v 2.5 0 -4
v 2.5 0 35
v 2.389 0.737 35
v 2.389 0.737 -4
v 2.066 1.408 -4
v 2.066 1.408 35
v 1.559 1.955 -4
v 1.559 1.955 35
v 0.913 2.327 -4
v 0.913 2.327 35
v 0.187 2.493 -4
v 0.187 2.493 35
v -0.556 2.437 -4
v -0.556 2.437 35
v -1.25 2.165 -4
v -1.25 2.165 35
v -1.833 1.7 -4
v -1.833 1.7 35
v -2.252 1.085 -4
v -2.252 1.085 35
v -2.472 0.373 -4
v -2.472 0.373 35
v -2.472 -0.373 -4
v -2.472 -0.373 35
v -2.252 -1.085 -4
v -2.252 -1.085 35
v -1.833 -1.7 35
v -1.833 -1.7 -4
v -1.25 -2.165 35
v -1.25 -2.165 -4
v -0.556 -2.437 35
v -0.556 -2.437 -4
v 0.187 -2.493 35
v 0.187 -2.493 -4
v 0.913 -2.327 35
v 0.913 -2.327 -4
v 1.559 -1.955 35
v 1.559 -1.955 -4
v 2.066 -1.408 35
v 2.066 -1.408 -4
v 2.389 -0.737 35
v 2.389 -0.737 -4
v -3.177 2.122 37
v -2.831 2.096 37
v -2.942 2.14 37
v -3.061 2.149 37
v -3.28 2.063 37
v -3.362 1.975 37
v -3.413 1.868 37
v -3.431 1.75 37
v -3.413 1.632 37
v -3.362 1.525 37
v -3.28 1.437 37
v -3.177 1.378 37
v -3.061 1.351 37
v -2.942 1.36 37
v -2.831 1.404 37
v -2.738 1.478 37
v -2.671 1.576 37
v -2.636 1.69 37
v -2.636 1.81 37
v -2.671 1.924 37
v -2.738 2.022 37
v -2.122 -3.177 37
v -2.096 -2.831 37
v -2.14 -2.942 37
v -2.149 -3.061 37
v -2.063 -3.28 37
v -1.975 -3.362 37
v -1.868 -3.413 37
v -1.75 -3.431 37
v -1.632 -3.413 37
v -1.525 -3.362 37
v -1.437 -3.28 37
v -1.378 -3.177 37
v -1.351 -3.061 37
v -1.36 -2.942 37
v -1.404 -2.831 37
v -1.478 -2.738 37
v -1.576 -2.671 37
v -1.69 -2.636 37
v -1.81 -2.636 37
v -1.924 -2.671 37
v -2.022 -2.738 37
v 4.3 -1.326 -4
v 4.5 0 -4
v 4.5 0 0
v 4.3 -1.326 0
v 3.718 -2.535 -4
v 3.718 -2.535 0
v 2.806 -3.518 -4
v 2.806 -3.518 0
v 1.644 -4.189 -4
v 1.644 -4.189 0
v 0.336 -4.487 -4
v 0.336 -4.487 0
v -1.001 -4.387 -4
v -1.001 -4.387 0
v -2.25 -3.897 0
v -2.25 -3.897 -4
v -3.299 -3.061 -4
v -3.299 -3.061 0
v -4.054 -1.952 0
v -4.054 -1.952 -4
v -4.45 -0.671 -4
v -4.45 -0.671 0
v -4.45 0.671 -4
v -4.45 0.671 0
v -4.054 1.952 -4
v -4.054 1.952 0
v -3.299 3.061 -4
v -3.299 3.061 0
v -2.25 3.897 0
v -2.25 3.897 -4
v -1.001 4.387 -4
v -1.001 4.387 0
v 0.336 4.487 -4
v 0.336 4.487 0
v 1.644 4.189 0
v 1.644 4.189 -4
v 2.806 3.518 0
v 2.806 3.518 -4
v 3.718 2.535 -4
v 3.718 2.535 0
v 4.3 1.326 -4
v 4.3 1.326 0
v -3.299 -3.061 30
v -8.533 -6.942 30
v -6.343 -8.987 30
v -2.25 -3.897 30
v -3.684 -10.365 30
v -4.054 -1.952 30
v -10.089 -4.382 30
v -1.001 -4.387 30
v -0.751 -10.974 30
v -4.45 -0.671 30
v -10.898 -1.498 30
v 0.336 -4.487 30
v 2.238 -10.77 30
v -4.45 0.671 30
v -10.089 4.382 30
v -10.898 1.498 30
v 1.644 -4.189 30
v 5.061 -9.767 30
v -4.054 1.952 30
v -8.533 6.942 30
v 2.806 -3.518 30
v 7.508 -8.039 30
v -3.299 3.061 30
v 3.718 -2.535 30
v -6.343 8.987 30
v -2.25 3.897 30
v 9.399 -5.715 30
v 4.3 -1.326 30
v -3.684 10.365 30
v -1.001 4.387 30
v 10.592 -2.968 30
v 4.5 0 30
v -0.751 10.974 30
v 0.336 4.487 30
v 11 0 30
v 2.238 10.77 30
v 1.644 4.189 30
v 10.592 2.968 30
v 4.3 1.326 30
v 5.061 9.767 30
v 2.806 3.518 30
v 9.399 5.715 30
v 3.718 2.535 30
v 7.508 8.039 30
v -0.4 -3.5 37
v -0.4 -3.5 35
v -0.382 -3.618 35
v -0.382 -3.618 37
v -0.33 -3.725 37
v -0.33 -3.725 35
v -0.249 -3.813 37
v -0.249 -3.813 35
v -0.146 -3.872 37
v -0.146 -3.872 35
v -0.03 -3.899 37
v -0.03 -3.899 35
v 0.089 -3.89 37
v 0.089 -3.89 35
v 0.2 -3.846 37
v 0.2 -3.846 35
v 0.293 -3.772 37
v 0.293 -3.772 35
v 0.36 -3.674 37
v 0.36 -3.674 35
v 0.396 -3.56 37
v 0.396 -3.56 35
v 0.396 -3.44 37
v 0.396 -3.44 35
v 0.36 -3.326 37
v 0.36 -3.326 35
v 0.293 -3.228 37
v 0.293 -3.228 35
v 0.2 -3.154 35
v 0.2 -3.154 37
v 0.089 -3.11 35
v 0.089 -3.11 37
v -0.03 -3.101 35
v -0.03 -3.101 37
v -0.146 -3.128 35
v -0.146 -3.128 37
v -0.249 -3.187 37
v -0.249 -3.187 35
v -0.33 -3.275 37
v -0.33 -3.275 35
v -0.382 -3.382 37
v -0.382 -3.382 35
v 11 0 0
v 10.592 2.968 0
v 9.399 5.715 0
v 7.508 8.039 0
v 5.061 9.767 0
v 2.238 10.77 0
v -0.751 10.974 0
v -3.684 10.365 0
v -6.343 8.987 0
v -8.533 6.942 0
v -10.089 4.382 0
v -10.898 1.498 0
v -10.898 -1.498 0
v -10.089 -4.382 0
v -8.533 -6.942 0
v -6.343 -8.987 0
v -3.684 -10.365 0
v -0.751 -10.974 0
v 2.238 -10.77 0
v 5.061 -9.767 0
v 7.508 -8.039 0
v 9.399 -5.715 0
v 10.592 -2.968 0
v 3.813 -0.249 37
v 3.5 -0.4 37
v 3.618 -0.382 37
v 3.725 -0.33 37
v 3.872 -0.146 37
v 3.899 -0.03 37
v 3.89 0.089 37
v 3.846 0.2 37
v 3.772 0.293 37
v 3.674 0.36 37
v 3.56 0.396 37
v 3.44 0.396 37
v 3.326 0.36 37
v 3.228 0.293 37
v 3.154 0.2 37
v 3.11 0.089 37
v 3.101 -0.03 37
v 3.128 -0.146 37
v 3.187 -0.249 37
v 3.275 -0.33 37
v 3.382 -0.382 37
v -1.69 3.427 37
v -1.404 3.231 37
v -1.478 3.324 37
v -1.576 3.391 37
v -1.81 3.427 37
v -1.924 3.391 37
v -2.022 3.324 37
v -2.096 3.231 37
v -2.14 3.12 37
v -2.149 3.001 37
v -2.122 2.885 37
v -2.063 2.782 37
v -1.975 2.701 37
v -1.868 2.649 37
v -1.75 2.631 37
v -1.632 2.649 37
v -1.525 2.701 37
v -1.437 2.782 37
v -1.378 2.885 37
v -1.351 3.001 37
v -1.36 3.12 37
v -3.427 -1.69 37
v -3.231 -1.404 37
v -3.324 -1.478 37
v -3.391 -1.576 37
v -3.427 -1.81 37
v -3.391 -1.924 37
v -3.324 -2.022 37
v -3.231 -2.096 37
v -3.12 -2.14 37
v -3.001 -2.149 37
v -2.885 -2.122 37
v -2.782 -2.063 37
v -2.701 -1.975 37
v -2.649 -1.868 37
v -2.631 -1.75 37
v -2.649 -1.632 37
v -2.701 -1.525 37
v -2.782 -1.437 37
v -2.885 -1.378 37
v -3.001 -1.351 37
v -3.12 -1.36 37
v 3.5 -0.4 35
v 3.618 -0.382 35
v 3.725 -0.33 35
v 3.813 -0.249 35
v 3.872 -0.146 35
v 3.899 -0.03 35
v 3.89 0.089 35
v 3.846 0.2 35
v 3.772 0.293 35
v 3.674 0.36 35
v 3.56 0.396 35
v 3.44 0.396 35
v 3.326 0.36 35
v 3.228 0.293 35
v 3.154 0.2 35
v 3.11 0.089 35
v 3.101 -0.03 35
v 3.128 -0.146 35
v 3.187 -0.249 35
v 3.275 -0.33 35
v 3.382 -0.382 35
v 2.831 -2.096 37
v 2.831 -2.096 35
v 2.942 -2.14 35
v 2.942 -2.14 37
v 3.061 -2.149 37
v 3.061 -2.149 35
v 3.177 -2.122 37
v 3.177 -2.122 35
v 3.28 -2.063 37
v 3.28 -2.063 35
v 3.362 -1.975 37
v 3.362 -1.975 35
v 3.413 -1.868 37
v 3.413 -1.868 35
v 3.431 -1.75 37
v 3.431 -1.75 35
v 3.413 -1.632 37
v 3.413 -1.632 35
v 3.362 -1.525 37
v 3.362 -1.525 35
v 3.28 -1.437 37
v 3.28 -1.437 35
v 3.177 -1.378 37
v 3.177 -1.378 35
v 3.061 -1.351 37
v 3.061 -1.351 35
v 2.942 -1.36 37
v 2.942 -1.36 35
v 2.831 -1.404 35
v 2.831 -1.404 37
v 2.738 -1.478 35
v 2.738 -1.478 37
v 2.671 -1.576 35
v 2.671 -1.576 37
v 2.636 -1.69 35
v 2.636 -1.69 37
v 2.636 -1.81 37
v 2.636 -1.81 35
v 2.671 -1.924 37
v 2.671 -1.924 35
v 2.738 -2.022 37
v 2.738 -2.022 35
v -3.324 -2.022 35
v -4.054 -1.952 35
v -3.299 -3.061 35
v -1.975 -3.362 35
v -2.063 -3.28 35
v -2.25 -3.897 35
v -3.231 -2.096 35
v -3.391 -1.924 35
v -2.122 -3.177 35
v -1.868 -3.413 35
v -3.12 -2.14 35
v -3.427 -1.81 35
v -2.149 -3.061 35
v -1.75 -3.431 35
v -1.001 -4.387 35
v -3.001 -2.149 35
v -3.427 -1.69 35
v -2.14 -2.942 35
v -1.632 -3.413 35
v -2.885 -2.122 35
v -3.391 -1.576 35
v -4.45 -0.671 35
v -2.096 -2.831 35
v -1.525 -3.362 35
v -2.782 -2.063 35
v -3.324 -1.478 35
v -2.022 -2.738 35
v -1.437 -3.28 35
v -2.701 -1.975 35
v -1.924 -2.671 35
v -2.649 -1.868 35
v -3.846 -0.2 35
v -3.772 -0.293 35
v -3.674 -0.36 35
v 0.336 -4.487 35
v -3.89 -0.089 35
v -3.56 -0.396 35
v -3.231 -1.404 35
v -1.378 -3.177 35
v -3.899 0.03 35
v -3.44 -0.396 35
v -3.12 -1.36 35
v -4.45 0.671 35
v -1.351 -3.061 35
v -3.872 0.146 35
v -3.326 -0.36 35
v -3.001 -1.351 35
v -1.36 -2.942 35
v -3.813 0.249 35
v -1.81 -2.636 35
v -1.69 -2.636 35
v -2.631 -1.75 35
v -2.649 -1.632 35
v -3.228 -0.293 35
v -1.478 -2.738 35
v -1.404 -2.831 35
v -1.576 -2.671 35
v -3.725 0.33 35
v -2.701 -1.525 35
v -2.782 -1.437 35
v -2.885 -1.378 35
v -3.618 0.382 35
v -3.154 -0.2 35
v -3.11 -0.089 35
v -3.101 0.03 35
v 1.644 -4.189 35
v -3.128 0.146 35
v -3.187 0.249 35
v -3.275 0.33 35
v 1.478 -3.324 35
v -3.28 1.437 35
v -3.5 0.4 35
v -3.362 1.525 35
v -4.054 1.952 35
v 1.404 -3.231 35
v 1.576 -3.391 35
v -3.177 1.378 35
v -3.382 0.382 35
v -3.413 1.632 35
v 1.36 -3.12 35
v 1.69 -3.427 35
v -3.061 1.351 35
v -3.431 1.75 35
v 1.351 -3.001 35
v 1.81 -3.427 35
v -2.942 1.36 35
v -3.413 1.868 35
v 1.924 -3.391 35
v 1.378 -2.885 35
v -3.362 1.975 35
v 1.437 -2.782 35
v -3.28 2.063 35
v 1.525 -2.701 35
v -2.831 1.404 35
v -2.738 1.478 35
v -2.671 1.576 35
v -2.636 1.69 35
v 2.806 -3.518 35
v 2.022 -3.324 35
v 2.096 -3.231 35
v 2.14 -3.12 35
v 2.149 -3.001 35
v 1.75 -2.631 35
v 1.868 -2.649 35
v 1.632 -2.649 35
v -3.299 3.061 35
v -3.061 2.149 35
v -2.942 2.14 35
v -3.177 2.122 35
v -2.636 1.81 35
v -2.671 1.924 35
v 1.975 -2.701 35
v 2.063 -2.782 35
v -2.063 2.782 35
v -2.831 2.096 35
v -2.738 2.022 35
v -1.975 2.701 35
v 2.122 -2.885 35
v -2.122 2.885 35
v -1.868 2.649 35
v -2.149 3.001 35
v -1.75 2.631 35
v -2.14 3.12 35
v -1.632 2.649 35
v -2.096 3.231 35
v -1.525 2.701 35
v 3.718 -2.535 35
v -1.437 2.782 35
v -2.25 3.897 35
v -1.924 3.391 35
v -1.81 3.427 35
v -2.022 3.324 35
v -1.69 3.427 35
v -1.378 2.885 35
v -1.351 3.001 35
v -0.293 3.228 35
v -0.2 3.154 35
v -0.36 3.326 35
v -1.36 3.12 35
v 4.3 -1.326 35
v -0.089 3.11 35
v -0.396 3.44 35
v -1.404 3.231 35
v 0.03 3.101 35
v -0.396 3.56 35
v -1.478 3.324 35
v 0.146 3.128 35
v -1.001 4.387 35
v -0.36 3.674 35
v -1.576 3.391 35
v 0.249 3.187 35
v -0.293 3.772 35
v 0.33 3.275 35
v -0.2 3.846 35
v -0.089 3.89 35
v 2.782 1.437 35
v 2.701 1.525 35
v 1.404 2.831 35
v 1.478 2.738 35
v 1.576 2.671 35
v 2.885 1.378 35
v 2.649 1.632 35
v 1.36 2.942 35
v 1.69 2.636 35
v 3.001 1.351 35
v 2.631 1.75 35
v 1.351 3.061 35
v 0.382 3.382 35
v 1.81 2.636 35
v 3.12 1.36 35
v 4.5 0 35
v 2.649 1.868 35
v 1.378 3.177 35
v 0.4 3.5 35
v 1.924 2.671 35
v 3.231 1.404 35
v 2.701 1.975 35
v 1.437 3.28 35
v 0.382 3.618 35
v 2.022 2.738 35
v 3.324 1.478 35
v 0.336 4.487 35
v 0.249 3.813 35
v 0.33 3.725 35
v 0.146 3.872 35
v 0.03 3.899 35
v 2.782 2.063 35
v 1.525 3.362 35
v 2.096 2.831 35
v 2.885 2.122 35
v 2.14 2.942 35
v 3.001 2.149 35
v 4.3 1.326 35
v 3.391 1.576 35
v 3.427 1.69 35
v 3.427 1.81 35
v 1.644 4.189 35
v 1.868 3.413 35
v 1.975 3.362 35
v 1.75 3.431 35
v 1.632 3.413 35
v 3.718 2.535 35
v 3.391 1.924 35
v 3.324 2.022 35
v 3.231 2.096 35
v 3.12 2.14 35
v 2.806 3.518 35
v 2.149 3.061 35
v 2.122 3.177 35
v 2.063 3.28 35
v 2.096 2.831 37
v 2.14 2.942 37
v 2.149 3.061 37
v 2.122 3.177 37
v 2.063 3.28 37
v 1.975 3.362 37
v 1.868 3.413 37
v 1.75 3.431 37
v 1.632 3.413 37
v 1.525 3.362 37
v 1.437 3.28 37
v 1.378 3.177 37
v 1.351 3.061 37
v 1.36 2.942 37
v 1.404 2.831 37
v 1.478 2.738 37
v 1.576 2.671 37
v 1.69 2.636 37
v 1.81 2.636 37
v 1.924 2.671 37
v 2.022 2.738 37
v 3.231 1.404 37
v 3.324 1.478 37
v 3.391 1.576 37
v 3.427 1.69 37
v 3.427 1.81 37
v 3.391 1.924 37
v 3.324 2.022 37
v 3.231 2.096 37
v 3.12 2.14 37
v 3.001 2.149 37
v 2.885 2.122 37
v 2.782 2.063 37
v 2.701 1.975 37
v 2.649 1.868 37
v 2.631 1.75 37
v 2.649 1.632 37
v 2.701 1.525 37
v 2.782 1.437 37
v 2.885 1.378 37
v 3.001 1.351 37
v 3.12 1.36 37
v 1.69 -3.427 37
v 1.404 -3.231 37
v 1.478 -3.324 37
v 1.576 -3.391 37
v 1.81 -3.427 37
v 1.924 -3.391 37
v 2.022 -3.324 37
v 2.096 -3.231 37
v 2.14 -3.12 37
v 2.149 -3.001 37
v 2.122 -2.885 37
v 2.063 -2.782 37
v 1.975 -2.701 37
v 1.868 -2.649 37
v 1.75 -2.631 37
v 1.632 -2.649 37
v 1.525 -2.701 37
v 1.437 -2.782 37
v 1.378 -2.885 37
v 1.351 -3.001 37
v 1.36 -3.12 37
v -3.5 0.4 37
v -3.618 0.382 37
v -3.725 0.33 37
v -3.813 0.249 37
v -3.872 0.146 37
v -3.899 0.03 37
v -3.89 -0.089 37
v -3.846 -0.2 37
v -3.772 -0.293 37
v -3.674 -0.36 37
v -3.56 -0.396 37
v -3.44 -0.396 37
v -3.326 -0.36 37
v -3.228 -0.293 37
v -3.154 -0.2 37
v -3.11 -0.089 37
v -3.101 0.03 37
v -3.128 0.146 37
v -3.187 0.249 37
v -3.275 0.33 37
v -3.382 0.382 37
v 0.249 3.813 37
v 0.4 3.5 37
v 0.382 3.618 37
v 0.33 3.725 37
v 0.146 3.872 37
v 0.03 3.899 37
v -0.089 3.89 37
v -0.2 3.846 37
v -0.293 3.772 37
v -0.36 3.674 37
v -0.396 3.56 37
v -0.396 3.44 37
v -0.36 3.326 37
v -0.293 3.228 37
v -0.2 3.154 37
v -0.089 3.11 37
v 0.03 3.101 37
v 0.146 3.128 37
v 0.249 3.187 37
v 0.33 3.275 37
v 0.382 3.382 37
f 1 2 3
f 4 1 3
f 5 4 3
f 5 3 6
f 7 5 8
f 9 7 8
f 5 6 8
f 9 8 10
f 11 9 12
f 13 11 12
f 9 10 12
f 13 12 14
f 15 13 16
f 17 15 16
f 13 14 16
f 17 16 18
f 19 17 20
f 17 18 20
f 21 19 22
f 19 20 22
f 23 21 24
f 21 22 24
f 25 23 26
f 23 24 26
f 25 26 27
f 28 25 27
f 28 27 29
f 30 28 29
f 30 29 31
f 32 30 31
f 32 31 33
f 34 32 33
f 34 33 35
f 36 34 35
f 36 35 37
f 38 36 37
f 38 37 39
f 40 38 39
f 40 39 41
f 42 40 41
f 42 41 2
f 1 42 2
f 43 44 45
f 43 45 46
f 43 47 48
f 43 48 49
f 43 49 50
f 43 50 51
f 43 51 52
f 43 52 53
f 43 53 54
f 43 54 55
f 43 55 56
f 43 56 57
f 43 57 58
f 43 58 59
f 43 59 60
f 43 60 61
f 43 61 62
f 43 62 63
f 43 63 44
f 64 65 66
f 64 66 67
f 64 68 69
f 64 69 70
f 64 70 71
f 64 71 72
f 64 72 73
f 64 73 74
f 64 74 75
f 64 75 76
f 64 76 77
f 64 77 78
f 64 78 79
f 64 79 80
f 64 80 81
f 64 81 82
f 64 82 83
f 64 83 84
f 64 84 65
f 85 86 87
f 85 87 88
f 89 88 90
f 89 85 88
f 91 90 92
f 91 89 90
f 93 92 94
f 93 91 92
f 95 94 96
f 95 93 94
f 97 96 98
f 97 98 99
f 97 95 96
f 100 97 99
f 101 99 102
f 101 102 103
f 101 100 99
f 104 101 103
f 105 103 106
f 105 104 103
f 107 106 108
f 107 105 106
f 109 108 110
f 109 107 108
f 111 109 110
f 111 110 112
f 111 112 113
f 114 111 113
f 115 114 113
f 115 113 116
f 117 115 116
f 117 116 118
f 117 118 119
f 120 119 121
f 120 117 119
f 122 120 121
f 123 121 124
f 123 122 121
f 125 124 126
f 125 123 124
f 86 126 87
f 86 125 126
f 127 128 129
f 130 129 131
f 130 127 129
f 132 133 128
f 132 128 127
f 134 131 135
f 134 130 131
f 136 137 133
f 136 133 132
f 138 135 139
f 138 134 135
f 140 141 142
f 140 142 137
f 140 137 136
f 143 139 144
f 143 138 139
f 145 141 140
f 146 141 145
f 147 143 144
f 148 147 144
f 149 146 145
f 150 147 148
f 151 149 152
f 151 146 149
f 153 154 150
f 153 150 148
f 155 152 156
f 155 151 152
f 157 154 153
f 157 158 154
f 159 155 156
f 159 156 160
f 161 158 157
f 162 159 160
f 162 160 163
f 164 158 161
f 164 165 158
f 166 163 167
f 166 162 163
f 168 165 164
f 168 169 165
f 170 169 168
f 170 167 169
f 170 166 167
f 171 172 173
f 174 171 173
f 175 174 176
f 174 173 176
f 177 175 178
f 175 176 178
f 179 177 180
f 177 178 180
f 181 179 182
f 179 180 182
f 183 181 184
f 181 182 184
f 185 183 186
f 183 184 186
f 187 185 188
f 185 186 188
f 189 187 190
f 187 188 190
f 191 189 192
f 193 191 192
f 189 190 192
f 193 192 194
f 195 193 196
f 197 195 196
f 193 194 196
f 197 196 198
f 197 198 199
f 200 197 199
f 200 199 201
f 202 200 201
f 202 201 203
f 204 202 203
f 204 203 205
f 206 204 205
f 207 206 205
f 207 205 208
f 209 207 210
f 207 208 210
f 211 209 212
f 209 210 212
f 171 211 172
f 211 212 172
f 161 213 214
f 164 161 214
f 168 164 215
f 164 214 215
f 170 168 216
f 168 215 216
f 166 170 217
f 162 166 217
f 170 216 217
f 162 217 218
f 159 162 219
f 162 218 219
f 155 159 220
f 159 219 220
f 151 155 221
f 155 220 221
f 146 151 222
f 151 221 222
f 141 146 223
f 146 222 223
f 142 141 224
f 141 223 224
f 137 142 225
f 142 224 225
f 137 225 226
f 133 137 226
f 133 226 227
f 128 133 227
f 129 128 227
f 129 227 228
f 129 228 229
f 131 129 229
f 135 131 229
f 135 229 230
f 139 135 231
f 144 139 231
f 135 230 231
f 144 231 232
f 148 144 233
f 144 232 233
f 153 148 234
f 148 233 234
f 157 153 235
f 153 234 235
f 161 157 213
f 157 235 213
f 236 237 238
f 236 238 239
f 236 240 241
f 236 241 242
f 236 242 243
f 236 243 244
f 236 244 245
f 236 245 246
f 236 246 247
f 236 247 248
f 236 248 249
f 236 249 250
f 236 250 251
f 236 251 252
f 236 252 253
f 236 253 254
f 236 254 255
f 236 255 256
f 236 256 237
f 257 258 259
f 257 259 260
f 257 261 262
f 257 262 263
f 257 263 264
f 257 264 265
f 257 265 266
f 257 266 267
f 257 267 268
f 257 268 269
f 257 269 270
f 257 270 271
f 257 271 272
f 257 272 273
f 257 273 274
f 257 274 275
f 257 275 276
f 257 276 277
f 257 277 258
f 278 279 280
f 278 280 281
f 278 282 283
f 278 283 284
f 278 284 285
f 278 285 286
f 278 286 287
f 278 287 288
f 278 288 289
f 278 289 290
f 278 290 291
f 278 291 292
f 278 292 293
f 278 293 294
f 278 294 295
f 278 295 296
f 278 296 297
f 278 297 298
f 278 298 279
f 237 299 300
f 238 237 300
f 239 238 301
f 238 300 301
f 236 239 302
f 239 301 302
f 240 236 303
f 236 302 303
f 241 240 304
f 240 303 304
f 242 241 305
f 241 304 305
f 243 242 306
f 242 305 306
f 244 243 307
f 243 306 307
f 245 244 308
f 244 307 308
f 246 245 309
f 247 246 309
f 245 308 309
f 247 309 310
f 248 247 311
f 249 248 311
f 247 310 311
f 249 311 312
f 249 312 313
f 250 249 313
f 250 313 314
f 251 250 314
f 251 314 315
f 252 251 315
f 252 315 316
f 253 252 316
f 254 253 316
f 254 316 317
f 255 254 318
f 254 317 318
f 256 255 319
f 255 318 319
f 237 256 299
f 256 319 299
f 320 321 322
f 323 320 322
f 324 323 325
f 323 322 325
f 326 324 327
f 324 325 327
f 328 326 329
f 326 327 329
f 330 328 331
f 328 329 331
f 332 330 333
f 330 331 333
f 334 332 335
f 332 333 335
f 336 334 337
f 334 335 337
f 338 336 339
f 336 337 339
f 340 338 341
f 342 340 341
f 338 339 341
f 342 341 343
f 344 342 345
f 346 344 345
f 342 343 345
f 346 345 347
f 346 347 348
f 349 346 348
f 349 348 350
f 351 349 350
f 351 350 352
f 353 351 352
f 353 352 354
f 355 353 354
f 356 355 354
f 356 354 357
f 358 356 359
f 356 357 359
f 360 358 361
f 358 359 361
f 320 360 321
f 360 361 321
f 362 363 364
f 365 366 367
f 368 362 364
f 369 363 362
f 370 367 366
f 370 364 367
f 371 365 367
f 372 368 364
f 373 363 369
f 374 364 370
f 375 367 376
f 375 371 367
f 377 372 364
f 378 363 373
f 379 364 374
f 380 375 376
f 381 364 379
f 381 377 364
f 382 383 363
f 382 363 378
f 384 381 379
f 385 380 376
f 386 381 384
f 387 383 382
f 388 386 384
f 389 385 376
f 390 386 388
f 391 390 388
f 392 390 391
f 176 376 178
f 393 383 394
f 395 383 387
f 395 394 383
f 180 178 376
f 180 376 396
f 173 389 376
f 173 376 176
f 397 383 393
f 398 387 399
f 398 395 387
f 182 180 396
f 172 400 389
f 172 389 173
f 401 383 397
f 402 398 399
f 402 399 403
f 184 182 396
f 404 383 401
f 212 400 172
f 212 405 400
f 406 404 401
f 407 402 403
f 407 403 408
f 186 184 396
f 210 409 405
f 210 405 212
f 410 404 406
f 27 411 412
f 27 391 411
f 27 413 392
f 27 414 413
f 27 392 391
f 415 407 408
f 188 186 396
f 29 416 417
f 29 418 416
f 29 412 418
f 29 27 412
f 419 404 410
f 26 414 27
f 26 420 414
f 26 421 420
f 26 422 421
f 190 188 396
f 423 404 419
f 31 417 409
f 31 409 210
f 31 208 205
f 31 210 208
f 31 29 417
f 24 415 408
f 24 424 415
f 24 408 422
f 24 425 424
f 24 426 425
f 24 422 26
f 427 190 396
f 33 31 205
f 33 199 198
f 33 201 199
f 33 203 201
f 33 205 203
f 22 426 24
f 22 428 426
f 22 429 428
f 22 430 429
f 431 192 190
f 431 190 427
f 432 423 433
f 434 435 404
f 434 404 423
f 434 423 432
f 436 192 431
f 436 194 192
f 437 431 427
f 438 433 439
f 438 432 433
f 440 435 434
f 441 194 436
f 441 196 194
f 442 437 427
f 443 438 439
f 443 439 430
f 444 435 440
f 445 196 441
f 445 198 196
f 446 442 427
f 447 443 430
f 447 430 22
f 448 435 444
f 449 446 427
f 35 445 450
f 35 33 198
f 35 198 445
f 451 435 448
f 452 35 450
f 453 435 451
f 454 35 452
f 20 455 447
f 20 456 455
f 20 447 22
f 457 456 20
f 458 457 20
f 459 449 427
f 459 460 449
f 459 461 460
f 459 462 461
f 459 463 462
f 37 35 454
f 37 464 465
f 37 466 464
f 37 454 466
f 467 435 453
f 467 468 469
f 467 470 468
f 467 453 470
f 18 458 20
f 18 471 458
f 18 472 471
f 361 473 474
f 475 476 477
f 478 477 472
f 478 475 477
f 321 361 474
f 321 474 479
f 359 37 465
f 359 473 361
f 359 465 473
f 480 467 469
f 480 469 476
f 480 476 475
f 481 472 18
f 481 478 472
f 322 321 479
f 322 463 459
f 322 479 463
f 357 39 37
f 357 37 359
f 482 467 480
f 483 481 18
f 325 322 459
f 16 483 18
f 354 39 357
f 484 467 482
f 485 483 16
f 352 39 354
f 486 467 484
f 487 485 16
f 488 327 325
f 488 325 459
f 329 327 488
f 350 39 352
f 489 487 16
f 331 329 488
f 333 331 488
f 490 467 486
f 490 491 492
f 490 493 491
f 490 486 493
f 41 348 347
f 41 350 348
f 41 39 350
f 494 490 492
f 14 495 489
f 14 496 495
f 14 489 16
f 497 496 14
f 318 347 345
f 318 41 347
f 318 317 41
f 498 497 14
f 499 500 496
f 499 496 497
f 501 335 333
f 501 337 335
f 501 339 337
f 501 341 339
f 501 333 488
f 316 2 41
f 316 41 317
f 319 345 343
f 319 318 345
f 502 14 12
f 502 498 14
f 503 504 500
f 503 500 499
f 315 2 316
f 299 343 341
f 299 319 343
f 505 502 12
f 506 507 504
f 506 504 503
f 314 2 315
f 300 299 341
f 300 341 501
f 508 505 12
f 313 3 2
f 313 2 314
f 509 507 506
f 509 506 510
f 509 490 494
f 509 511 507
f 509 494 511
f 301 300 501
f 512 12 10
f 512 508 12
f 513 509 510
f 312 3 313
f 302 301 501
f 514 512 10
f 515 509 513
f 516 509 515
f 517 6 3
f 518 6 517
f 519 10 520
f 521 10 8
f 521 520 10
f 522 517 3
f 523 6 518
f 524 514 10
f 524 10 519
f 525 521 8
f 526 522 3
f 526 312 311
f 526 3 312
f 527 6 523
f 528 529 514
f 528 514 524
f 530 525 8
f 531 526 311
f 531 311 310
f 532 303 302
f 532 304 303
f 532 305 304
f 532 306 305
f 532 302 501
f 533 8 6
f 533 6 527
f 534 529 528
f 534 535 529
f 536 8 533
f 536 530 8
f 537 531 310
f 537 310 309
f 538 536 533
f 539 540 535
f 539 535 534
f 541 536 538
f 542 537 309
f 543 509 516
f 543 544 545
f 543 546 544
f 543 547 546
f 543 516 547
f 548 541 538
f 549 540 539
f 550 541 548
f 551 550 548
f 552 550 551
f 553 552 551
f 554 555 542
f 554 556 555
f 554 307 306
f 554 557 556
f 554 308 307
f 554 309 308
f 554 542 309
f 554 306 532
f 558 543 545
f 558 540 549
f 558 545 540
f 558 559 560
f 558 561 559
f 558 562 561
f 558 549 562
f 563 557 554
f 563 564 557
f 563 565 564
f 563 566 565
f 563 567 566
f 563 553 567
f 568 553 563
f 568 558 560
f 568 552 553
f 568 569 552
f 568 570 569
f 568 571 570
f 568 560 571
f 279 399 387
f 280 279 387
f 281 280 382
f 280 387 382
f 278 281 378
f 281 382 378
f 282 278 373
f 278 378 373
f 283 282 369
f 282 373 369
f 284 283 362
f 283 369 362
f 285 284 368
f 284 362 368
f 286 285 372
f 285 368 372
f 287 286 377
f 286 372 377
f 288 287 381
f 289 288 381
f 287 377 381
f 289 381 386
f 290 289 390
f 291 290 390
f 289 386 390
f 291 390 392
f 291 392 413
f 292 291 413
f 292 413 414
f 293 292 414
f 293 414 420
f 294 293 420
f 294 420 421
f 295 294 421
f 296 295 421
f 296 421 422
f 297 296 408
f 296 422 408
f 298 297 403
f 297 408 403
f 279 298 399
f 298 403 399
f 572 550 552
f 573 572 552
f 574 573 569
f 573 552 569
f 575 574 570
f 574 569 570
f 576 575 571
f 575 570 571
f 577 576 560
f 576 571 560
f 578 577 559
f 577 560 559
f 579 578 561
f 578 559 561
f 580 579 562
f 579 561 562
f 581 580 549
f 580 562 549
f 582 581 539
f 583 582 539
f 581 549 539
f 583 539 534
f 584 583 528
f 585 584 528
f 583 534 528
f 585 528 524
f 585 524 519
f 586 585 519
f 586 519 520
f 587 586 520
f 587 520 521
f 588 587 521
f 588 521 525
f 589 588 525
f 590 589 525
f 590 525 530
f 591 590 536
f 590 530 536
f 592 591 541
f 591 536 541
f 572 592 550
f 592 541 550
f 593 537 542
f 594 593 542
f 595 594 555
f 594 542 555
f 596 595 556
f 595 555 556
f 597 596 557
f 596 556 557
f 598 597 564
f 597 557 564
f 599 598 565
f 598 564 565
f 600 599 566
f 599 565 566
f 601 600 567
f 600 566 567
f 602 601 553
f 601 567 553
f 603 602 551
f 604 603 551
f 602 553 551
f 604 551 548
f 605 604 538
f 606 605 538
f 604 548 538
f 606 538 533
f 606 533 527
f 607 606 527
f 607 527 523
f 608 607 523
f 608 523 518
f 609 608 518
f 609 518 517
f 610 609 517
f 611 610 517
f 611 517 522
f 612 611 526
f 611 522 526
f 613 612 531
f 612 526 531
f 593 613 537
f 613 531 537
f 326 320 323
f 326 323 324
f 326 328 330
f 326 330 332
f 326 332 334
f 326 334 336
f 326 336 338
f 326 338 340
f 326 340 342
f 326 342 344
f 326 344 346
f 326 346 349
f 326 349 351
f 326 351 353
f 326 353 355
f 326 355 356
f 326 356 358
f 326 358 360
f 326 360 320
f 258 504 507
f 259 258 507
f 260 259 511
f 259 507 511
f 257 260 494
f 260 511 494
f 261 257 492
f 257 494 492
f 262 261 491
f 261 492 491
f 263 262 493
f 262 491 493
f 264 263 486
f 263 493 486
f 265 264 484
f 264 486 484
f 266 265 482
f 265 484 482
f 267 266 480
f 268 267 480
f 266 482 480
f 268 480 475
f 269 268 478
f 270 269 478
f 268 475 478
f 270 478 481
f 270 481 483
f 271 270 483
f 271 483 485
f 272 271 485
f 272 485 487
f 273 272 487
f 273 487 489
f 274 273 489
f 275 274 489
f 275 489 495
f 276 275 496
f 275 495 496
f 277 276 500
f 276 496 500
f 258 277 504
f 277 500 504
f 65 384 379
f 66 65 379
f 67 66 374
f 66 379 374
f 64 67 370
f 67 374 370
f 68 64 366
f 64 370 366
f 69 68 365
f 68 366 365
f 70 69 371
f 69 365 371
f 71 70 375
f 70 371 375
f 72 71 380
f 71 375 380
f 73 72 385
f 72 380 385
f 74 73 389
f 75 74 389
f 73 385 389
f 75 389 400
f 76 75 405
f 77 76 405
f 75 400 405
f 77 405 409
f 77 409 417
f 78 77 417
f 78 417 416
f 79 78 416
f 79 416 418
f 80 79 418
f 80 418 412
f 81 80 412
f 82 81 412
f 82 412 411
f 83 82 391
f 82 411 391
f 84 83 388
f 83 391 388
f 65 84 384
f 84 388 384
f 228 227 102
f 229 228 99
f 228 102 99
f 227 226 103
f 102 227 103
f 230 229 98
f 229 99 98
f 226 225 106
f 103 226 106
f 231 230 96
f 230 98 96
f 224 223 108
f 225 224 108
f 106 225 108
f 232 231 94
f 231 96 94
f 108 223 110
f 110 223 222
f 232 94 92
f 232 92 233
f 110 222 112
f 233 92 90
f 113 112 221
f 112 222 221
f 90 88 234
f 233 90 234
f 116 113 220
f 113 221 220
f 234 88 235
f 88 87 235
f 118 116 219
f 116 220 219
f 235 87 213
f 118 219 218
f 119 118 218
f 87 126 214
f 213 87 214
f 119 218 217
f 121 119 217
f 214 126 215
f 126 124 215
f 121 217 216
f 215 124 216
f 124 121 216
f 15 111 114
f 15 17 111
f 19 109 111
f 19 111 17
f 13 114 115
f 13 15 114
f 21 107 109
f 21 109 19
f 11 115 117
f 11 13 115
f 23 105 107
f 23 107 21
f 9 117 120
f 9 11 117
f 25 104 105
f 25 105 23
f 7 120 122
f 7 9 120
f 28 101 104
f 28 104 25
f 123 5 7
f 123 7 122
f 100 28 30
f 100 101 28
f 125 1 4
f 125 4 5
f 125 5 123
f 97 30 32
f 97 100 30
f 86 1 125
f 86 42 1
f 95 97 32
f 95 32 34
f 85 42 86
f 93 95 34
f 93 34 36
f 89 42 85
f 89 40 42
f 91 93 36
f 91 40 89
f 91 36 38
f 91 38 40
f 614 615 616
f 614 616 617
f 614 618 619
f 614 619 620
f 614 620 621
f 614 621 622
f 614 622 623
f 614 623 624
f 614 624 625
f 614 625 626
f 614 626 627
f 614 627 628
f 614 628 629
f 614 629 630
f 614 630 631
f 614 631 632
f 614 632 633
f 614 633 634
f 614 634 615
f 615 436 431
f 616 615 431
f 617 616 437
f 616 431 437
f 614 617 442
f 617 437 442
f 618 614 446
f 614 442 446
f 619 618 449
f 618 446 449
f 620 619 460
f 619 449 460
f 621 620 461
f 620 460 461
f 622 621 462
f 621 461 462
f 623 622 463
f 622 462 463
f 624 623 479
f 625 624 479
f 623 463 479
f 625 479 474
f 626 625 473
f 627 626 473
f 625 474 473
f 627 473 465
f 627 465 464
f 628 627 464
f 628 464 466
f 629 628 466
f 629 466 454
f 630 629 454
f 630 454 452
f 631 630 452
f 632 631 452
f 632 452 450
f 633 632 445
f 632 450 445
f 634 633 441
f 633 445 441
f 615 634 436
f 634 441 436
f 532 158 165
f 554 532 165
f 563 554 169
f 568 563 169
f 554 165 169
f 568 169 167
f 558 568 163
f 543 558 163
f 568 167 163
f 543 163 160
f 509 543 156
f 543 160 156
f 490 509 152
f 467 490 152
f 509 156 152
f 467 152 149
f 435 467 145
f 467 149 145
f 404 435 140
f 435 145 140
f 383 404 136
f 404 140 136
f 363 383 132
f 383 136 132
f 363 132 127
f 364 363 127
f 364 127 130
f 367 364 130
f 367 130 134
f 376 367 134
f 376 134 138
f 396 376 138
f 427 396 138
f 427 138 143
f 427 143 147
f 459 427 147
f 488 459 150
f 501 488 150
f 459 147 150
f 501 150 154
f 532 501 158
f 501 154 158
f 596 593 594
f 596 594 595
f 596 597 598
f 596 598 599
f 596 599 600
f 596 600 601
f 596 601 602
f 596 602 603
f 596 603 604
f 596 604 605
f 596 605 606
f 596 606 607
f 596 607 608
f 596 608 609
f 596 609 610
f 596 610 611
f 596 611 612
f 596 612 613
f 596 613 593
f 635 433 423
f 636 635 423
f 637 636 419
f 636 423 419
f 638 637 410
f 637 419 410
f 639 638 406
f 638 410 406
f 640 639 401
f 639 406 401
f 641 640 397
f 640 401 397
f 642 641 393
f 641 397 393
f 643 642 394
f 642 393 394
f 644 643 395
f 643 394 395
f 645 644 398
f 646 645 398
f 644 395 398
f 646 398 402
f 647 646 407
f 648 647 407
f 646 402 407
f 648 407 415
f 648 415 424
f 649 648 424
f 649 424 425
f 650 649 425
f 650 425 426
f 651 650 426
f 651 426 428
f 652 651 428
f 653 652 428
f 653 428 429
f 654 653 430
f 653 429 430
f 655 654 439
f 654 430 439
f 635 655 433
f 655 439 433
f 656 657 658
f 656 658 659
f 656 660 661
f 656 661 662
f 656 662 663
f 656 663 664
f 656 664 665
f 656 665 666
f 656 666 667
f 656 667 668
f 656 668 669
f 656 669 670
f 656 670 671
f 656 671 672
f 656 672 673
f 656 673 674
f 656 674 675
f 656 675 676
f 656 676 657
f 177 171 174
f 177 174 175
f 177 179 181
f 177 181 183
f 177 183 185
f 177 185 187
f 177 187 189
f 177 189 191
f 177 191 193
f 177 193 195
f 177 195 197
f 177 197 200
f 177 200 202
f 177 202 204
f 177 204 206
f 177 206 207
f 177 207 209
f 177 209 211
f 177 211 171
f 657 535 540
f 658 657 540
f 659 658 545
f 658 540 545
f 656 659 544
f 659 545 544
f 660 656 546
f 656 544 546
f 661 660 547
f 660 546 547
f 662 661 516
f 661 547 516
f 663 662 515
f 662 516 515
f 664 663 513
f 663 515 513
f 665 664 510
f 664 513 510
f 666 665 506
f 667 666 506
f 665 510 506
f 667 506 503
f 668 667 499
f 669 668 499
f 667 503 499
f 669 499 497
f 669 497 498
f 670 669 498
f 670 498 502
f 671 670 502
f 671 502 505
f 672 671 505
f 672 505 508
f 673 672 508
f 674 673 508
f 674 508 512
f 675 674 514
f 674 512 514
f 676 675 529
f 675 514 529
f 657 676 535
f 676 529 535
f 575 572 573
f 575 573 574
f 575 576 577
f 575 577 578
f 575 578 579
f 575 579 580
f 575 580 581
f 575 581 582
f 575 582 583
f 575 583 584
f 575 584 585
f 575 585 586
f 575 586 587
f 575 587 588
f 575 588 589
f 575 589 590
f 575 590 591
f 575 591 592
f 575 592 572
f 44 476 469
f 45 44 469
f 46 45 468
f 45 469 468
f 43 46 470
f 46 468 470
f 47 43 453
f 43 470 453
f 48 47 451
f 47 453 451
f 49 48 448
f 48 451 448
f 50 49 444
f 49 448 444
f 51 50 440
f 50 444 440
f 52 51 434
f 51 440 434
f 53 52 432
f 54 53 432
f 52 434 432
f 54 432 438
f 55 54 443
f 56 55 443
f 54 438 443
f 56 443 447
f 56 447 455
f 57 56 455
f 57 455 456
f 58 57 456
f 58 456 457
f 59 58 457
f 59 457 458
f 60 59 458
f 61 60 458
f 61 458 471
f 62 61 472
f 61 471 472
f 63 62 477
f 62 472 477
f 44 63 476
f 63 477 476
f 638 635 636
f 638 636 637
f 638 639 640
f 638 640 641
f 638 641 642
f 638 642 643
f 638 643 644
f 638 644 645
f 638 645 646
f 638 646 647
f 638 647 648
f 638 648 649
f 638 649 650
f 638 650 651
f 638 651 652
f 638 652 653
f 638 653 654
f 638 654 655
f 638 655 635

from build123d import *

# Parameters (mm, degrees)
SKETCH2_R           = 11
BOSS_EXTRUDE1_DEPTH = 30
SKETCH3_R           = 4.5
BOSS_EXTRUDE2_DEPTH = 5
BOSS_EXTRUDE3_START = 4
SKETCH4_R           = 4.5
BOSS_EXTRUDE3_DEPTH = 4
SKETCH5_R           = 2.5
CUT_EXTRUDE1_DEPTH  = 42.98809355
SKETCH6_R           = 0.4
BOSS_EXTRUDE4_DEPTH = 2
CIRPATTERN1_COUNT   = 12


with BuildPart() as part:
    # Sketch2 → Boss-Extrude1 (new body)
    with BuildSketch(Plane.XY):
        Circle(SKETCH2_R)
    extrude(amount=BOSS_EXTRUDE1_DEPTH)

    # Sketch3 → Boss-Extrude2 (add)
    with BuildSketch(Plane.XY.offset(30)):
        Circle(SKETCH3_R)
    extrude(amount=BOSS_EXTRUDE2_DEPTH)

    # Sketch4 → Boss-Extrude3 (add)
    with BuildSketch(Plane(origin=(0, 0, 0), x_dir=(-1, 0, 0), z_dir=(0, 0, -1)).offset(BOSS_EXTRUDE3_START)):
        with Locations(Location((0, 0, 0), (0, 0, 180))):
            Circle(SKETCH4_R)
    extrude(amount=-BOSS_EXTRUDE3_DEPTH)

    # Sketch5 → Cut-Extrude1 (cut, through all)
    with BuildSketch(Plane.XY.offset(35)):
        Circle(SKETCH5_R)
    extrude(amount=-CUT_EXTRUDE1_DEPTH, mode=Mode.SUBTRACT)

    # Sketch6 → Boss-Extrude4 (add)
    with BuildSketch(Plane.XY.offset(35)):
        with Locations((0, 3.5)):
            Circle(SKETCH6_R)
    boss_extrude4 = extrude(amount=BOSS_EXTRUDE4_DEPTH)

    # CirPattern1: Boss-Extrude4 ×12 about axis
    cirpattern1_axis = Axis((0, 0, 0), (0, 0, 1))
    for i in range(1, CIRPATTERN1_COUNT):
        add(boss_extrude4.rotate(cirpattern1_axis, i * 360 / CIRPATTERN1_COUNT))


solid = part.part
